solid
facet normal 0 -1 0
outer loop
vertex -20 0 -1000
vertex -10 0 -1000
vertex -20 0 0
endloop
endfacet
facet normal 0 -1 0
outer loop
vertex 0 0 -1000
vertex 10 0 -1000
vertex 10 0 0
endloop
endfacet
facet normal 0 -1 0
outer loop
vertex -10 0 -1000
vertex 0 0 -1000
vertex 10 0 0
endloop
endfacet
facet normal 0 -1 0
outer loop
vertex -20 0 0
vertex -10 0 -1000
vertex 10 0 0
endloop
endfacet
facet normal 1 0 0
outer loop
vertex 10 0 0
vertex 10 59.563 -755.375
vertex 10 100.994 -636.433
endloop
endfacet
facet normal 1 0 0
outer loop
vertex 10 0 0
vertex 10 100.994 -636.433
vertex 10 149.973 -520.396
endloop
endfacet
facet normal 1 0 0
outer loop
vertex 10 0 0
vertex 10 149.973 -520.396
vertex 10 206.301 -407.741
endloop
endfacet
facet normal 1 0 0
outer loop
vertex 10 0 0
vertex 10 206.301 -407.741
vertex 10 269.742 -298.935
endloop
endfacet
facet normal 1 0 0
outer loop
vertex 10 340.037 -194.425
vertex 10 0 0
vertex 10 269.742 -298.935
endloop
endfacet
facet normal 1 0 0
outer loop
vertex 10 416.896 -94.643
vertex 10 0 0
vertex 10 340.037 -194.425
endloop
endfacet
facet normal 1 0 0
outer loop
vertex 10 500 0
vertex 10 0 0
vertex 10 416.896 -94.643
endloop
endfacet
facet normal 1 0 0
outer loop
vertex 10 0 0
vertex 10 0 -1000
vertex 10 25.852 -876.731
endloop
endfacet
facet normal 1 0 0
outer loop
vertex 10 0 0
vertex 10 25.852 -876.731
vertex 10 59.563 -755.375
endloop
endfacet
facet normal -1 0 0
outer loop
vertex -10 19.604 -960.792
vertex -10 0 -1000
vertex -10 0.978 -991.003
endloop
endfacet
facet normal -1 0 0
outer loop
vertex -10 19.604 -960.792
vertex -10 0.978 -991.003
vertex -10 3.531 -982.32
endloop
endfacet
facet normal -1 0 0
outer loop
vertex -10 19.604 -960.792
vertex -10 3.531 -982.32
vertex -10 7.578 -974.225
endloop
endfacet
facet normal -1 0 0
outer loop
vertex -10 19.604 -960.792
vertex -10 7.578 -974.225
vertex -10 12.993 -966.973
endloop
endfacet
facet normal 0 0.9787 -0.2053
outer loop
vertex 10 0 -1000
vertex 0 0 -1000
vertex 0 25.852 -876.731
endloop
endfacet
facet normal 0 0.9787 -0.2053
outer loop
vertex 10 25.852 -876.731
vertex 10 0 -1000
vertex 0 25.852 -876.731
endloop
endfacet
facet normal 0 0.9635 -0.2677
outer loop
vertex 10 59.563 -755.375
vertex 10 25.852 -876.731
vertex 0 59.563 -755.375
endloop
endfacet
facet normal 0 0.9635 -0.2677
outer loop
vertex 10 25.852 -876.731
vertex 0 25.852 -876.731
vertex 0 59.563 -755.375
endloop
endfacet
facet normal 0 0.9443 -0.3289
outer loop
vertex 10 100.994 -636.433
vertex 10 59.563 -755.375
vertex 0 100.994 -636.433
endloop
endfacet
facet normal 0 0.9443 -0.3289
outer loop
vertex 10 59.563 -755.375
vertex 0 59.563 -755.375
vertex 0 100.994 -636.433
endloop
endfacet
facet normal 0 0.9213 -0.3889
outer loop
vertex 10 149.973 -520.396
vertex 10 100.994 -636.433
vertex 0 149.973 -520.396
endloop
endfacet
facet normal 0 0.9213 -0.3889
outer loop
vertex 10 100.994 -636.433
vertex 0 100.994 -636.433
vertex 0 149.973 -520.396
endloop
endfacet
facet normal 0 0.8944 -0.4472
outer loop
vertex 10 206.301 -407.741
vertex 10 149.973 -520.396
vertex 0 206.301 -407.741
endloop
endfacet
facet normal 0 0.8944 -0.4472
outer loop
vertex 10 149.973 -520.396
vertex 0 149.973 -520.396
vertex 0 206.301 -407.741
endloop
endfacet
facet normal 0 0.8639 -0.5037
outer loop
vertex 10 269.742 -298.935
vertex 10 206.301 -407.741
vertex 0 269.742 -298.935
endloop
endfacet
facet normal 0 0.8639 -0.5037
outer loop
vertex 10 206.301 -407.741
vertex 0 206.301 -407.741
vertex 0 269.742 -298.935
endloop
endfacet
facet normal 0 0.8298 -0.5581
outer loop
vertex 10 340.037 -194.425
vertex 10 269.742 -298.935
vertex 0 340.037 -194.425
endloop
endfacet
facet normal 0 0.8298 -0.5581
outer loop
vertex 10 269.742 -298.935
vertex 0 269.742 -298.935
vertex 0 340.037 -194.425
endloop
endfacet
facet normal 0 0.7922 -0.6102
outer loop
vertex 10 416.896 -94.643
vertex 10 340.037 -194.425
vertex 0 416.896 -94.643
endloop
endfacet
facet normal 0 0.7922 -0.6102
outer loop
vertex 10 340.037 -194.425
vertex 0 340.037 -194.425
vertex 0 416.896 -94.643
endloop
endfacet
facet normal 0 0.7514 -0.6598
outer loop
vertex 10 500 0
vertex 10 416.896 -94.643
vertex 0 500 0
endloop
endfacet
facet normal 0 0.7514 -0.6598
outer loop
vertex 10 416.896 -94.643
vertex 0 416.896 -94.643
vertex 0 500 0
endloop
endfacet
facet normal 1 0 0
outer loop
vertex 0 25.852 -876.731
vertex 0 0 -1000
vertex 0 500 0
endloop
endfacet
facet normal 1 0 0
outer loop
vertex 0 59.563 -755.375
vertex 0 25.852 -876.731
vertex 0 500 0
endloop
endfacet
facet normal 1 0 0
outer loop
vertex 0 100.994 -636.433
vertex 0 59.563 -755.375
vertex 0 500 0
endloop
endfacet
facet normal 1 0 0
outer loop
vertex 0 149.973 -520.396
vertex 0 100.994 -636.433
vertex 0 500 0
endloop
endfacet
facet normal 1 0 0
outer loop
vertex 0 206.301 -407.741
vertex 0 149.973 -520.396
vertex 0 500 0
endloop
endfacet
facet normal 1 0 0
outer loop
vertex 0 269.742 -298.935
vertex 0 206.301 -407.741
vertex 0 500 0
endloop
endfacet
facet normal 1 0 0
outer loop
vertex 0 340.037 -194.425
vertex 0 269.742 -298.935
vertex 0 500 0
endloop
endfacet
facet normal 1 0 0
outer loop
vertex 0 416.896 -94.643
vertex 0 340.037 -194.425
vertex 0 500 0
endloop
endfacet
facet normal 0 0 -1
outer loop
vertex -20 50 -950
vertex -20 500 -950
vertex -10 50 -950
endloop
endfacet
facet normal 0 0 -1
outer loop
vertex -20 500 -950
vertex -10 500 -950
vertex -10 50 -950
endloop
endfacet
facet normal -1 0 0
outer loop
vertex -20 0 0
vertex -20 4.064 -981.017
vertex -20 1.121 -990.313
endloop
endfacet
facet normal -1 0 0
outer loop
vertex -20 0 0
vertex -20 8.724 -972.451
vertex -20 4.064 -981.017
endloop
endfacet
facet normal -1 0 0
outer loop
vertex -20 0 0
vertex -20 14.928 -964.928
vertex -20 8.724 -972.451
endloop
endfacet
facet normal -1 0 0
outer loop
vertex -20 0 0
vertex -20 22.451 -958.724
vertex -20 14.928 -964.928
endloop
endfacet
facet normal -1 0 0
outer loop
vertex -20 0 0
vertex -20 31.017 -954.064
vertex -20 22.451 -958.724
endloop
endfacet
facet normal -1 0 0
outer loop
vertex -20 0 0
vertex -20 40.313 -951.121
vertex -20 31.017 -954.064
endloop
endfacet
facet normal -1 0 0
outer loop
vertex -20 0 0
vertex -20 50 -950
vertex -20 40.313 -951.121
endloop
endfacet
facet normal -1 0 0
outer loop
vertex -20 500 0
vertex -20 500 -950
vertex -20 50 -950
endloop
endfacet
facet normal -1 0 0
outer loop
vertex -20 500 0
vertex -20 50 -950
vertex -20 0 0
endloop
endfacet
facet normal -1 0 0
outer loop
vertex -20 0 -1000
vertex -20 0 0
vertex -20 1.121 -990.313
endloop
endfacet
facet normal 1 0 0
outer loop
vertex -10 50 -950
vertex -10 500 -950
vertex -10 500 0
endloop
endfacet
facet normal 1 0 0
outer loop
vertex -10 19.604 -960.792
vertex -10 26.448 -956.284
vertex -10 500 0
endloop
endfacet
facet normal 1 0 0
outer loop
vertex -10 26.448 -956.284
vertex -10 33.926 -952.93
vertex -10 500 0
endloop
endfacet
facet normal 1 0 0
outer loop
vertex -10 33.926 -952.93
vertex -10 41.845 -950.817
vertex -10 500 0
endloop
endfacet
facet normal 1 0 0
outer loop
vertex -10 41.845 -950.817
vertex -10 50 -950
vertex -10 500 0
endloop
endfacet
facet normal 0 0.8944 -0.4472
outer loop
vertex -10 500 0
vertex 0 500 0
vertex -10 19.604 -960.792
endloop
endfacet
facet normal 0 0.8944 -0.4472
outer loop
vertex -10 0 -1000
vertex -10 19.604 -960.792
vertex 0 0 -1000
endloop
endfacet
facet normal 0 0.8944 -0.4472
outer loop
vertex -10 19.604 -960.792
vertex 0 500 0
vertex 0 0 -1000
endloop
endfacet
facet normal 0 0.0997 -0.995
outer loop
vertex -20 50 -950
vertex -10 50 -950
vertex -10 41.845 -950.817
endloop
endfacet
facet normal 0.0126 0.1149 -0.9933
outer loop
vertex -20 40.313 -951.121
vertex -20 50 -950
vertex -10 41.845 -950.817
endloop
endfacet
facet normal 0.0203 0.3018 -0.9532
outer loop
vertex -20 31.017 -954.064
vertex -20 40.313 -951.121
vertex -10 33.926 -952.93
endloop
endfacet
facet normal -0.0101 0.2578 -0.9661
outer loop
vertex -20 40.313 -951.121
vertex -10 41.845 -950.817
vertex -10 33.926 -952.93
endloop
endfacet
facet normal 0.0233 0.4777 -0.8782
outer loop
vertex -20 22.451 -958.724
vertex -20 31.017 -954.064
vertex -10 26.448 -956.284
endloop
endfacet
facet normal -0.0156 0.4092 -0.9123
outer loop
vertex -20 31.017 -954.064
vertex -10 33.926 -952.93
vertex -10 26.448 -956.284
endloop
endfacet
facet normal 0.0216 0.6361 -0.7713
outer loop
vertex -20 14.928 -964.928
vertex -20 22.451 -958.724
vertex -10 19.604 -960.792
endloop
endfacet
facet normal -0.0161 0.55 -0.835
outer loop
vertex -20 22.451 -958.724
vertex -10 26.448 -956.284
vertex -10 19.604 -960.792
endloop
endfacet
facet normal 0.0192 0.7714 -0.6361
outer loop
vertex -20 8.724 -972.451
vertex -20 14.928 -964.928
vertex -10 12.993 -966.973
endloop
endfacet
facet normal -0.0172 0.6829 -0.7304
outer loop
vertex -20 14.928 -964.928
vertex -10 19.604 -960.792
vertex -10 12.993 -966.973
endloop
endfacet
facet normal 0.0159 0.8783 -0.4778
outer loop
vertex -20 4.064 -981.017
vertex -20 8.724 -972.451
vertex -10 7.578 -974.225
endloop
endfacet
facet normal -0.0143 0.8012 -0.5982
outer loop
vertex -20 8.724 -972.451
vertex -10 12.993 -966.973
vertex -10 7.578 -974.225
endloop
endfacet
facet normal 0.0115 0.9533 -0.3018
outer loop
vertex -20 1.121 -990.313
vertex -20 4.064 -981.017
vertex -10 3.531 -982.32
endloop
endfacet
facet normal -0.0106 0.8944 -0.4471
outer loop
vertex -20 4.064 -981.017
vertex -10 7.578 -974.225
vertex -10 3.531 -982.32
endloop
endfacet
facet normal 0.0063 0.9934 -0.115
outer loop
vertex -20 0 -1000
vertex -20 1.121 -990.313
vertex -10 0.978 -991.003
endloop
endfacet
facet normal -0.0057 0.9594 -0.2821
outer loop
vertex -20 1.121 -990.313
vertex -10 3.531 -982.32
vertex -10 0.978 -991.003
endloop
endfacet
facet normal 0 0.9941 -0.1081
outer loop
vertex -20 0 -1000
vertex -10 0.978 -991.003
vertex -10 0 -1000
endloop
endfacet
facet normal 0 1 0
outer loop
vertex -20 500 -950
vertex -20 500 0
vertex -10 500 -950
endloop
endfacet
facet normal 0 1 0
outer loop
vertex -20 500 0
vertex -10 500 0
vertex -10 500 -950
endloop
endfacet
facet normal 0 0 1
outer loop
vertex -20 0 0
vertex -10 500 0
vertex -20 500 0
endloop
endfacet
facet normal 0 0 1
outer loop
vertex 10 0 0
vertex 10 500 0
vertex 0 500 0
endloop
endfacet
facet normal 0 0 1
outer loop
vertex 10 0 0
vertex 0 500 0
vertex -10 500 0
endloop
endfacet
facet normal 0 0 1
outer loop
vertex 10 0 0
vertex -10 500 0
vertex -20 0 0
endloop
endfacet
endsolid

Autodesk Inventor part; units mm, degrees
ref_plane "YZ Plane" through (0, 0, 0) normal (1, 0, 0) x (0, 1, 0)
ref_plane "XZ Plane" through (0, 0, 0) normal (0, 1, 0) x (-1, 0, 0)
ref_plane "XY Plane" through (0, 0, 0) normal (0, 0, 1) x (1, 0, 0)
sketch "Sketch1" plane through (0, 0, 0) normal (1, 0, 0) x (0, 1, 0)
  line L0 (0, 0) -> (500, 0)
  line L1 (500, 0) -> (500, -10)
  line L2 (500, -10) -> (0, -10)
  line L3 (0, -10) -> (0, 0)
  line L4 (0, 0) -> (10, 0)
  line L5 (10, 0) -> (10, -1000)
  line L6 (10, -1000) -> (0, -1000)
  line L7 (0, -1000) -> (0, 0)
  arc A0 (500, 0) -> (0, -1000) centre (1931.4141, -1340.707) ccw
  dimension "d0" = 500
  dimension "d1" = 10
  dimension "d2" = 10
  dimension "d3" = 1000
extrude "Extrusion1" add sketch "Sketch1" along normal blind 10 contours L0 L5 L2 L3 | L0 A0 L2 L5 | L2 L5 A0 L7 | L2 A0 L5
sketch "Sketch2" plane through (10, 0, 0) normal (1, 0, 0) x (0, 0, -1)
  point P0 (0, 0)
sketch "Sketch3" plane through (0, 0, 0) normal (-1, 0, 0) x (0, 0, 1)
  line L0 (0, 0) -> (-1000, 0) projected
  line L1 (0, 0) -> (-1000, 0)
  arc A0 (-1000, 0) -> (0, 500) centre (-1340.707, 1931.4141) ccw projected
  line L2 (0, 500) -> (0, 0) projected
  line L3 (0, 500) -> (0, 0)
  line L4 (0, 500) -> (-1000, 0)
extrude "Extrusion2" add sketch "Sketch3" along normal blind 10
sketch "Sketch4" plane through (10, 0, 0) normal (1, 0, 0) x (0, 0, -1)
  line L0 (0, 500) -> (0, 0) projected
  line L1 (0, 500) -> (0, 0)
  line L2 (0, 0) -> (1000, 0) projected
  line L3 (0, 0) -> (1000, 0)
sketch "Sketch5" plane through (-10, 0, 0) normal (-1, 0, 0) x (0, 0, 1)
  line L0 (0, 0) -> (-1000, 0) construction
  line L1 (-1000, 0) -> (-950, 0) construction
  line L2 (-950, 0) -> (-950, 50) construction
  line L3 (-950, 50) -> (-1000, 50) construction
  line L4 (-1000, 50) -> (-1000, 0) construction
  arc A0 (-1000, 0) -> (-950, 50) centre (-1000.9904, 50.9904) ccw
  line L5 (-1000, 0) -> (-950, 0)
  line L6 (-950, 50) -> (-950, 0)
  dimension "d8" = 50
  dimension "d9" = 50
  dimension "d10" = 51
extrude "Extrusion3" add sketch "Sketch5" along normal blind 10
sketch "Sketch6" plane through (-10, 0, 0) normal (-1, 0, 0) x (0, 0, 1)
  line L0 (-950, 0) -> (0, 0) projected
  line L1 (0, 500) -> (0, 0) projected
  line L2 (-950, 0) -> (0, 0)
  line L3 (0, 0) -> (0, 500)
  line L4 (0, 500) -> (-950, 500)
  line L5 (-950, 500) -> (-950, 0)
extrude "Extrusion4" add sketch "Sketch6" along normal blind 10
properties part number "ramps"
